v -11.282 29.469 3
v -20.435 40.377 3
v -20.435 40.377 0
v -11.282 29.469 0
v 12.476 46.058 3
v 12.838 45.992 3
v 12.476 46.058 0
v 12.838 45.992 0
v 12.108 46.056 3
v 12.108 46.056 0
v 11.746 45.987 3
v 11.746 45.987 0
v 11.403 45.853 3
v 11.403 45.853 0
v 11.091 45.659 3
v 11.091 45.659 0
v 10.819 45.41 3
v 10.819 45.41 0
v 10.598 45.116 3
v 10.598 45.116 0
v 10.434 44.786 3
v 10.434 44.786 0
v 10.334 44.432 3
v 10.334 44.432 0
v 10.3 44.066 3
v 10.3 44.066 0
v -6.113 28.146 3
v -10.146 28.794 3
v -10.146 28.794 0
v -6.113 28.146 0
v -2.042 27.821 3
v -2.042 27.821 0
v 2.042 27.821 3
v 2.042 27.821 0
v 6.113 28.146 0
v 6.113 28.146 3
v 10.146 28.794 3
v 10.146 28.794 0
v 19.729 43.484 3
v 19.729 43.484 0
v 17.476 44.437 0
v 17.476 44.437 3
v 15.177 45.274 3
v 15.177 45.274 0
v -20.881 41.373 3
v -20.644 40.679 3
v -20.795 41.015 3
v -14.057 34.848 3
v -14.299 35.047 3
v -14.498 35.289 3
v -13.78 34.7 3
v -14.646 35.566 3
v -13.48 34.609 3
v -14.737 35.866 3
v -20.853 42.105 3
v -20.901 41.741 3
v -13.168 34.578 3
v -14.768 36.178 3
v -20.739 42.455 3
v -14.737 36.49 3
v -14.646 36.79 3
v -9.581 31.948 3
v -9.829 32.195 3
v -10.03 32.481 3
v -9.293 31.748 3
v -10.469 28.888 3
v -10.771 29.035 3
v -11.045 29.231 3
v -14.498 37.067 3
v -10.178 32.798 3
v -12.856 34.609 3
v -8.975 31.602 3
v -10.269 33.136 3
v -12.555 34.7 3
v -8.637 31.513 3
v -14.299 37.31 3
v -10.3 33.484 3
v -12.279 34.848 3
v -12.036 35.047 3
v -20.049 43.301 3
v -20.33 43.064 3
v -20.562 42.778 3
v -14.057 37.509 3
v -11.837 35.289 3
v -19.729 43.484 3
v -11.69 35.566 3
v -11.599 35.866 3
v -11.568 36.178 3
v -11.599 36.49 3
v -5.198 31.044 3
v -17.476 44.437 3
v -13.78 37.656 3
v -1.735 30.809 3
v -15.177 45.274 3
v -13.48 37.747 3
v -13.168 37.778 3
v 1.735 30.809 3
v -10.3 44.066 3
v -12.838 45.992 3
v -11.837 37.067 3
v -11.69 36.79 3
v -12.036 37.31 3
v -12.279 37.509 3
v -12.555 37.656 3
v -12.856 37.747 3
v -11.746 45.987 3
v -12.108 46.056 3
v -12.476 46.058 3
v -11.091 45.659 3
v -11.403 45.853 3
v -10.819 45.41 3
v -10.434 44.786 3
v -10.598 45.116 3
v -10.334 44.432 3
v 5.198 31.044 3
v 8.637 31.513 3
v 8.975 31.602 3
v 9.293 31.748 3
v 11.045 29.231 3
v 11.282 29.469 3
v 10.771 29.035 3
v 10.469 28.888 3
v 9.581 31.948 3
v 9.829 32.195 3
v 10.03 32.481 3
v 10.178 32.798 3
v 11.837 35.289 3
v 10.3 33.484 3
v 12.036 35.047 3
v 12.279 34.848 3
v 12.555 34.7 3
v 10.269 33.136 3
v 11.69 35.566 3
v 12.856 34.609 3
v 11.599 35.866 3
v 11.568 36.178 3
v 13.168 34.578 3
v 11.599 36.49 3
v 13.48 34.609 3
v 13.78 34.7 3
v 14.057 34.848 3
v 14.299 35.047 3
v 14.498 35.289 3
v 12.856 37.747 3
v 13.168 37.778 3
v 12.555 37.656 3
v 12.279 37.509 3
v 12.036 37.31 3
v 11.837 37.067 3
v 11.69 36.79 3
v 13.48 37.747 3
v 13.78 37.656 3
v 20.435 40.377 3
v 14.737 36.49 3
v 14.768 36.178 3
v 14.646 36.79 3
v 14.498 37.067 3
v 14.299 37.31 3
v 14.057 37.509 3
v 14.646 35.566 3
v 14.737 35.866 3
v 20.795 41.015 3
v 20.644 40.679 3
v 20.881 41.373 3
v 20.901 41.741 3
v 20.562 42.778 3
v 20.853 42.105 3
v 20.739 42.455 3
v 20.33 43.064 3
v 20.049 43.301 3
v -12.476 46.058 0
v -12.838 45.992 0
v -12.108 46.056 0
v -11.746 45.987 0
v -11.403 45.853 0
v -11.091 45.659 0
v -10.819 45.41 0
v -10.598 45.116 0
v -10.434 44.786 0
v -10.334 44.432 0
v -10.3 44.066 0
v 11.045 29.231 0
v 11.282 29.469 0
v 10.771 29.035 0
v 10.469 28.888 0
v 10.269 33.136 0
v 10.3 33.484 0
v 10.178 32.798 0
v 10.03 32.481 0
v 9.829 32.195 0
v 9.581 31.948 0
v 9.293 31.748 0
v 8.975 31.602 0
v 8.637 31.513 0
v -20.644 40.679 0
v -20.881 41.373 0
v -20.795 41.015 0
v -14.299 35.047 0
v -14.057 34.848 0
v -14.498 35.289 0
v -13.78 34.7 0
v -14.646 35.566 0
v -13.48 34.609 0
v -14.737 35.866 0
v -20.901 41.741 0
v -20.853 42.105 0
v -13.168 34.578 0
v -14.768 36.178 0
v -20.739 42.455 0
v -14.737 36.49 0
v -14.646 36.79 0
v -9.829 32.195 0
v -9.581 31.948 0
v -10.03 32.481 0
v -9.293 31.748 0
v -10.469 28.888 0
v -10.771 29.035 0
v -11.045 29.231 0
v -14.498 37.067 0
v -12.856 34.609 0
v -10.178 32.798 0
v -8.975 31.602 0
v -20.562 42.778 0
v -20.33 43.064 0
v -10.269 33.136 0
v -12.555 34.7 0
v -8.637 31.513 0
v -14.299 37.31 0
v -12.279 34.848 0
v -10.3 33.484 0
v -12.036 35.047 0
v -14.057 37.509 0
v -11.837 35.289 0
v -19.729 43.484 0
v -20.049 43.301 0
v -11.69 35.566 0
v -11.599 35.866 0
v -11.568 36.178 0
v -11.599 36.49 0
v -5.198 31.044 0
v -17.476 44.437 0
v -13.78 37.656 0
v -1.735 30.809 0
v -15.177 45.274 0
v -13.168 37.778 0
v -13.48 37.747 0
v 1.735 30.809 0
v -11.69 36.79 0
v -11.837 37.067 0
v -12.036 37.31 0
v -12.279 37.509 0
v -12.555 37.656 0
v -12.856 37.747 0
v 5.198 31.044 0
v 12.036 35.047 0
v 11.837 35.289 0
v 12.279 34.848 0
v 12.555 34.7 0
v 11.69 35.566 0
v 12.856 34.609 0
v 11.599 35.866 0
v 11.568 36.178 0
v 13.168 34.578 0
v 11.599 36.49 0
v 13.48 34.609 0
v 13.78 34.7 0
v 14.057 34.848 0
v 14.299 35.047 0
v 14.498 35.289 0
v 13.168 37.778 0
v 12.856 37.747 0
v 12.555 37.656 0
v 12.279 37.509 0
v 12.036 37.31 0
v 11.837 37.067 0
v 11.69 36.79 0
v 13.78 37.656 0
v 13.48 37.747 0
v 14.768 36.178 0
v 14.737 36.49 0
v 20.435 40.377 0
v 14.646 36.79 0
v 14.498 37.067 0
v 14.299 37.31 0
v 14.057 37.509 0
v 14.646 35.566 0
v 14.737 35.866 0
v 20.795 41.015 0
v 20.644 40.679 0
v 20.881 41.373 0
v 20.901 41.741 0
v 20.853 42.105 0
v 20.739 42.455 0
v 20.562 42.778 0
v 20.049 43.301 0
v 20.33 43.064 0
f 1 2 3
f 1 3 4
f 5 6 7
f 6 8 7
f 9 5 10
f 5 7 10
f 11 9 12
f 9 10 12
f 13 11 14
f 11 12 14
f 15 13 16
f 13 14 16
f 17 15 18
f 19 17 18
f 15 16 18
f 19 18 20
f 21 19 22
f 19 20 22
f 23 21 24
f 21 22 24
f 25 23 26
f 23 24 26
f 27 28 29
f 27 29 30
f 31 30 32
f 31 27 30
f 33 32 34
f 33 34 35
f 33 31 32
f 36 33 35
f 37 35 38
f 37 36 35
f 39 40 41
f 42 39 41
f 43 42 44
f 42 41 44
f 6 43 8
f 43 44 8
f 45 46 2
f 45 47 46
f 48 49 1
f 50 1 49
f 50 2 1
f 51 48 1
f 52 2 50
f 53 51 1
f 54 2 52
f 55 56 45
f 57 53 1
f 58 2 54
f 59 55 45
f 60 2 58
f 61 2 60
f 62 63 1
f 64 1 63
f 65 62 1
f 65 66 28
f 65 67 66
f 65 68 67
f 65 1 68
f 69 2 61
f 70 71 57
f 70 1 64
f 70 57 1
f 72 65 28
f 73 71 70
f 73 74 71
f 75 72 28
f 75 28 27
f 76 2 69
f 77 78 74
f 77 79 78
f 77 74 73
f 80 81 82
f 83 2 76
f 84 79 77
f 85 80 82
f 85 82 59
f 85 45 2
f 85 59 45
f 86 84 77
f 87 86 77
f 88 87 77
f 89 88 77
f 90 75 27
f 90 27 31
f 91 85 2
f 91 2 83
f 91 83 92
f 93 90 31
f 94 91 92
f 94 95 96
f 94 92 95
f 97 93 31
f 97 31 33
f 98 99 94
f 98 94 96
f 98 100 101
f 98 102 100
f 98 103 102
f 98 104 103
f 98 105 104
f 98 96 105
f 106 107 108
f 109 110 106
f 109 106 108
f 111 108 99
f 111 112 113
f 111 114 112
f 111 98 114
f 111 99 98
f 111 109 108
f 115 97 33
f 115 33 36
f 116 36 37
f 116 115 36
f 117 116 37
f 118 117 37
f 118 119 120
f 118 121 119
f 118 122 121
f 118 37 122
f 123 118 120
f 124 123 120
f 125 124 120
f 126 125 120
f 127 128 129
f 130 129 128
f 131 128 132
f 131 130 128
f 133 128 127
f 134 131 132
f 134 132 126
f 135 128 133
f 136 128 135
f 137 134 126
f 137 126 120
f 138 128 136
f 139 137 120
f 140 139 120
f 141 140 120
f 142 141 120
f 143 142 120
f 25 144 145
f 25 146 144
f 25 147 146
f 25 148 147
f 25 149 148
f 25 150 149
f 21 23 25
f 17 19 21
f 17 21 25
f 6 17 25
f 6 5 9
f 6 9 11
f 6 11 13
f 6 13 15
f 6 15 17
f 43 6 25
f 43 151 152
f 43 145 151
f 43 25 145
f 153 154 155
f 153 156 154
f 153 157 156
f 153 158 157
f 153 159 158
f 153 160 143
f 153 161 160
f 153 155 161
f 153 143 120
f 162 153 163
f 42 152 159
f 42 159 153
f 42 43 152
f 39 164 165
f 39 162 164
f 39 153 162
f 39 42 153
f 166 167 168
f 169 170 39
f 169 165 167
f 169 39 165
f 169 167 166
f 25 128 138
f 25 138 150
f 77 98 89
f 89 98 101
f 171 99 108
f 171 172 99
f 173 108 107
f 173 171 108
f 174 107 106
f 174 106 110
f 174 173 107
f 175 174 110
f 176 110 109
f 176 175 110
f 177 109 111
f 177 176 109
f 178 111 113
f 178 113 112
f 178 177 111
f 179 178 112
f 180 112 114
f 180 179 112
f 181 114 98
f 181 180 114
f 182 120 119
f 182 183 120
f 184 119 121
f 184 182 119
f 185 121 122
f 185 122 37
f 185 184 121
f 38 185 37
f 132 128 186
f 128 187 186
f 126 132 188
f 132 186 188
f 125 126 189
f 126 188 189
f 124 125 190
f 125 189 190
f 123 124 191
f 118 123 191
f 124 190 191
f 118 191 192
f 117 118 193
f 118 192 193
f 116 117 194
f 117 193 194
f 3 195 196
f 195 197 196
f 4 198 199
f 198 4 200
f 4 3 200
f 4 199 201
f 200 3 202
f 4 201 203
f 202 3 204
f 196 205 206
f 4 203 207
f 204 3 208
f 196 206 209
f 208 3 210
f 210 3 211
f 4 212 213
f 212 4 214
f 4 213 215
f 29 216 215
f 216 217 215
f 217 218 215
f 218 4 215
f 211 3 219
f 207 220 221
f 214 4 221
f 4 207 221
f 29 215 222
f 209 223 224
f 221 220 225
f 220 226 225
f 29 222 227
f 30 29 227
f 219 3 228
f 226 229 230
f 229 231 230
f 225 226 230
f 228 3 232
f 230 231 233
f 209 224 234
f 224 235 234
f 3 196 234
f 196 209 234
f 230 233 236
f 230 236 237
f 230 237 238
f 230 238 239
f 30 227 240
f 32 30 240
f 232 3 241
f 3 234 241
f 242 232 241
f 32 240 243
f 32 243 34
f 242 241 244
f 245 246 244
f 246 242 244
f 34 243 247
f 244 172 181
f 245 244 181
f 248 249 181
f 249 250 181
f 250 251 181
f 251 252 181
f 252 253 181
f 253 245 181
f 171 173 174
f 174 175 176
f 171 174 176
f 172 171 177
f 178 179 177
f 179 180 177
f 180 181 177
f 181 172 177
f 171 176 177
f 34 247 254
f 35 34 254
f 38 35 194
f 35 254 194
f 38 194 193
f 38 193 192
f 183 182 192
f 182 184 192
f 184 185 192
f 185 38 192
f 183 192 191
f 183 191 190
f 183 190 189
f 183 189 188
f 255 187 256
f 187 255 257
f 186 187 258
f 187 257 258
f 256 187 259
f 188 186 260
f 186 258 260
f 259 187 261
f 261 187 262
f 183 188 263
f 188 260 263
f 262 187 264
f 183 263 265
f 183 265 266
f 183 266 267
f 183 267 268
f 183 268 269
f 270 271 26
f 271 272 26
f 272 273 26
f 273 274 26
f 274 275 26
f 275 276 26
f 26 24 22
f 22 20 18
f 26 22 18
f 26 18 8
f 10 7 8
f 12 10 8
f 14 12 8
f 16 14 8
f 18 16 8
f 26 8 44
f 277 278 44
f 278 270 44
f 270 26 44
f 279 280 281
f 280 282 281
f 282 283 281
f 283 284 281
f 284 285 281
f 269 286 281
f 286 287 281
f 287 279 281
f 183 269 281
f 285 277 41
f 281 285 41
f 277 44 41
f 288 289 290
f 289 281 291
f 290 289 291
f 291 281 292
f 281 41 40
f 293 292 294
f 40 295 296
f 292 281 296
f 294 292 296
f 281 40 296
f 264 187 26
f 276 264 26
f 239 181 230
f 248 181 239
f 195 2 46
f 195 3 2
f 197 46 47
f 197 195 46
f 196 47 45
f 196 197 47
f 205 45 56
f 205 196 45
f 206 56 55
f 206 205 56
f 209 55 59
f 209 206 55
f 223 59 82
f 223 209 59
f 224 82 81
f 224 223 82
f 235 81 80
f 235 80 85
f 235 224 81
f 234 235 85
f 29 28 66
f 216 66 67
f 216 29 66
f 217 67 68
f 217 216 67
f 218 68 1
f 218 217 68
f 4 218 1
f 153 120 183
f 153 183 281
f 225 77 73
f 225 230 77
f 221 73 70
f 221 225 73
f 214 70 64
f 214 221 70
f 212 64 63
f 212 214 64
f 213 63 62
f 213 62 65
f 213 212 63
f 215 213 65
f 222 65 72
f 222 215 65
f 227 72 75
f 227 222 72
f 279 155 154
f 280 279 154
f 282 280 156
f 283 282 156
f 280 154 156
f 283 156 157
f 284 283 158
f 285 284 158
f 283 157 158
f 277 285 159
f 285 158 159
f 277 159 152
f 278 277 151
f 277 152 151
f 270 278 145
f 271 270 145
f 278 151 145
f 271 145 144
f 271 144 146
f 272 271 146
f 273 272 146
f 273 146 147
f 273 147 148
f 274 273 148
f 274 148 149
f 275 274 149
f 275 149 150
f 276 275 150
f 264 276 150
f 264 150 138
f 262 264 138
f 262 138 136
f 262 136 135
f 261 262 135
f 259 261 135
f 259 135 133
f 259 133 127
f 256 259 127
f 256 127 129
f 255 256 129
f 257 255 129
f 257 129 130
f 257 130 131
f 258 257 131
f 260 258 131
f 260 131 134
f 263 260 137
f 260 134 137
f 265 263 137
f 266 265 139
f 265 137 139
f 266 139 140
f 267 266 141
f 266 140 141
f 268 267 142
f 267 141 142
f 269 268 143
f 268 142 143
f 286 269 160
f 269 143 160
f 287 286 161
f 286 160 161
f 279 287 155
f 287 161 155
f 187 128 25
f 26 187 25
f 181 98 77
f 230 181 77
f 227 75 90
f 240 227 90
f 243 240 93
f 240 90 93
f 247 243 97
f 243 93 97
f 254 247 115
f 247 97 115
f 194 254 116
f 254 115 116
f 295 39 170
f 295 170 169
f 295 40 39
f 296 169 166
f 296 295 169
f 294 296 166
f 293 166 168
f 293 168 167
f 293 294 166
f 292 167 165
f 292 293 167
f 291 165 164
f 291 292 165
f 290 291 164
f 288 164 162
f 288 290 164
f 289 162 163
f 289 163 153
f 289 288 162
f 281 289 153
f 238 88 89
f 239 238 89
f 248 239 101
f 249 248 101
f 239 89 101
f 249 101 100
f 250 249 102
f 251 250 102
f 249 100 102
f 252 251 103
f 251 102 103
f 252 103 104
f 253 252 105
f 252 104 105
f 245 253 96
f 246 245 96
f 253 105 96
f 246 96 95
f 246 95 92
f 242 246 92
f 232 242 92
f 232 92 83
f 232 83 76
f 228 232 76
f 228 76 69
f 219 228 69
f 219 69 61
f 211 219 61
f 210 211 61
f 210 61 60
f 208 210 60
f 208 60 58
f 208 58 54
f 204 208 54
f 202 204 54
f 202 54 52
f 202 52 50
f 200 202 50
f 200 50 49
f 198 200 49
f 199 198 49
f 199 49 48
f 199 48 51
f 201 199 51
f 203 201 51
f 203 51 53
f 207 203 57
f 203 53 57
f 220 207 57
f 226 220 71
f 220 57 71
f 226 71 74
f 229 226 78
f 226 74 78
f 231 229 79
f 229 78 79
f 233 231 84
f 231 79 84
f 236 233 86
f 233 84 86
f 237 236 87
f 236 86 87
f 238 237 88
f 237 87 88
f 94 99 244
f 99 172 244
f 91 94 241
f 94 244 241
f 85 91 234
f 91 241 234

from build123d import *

# Parameters (mm, degrees)
SKETCH_1_R          = 47.75
EXTRUDE_1_DEPTH     = 3
SKETCH_2_R          = 1.6
CUT_EXTRUDE_1_DEPTH = 68.595303091
FILLET_1_R          = 2


with BuildPart() as part:
    # ｽｹｯﾁ1 → ﾎﾞｽ - 押し出し1 (new body)
    with BuildSketch(Plane.XY):
        Circle(SKETCH_1_R)
    extrude(amount=EXTRUDE_1_DEPTH)

    # ｽｹｯﾁ2 → ｶｯﾄ - 押し出し1 (cut, through all)
    with BuildSketch(Plane.XY.offset(3)):
        with Locations((-13.167775518, 36.1781659)):
            Circle(SKETCH_2_R)
        with Locations((13.167775518, 36.1781659)):
            Circle(SKETCH_2_R)
        with BuildLine():
            Line((-10.3, 46.625878008), (-10.3, 31.825692416))
            ThreePointArc((-10.3, 31.825692416), (0, 30.78), (10.3, 31.825692416))
            Line((10.3, 31.825692416), (10.3, 46.625878008))
            ThreePointArc((10.3, 46.625878008), (0, 47.75), (-10.3, 46.625878008))
        make_face()
        with BuildLine():
            Line((-22.08027891, 42.338207133), (-10.836871488, 28.938835945))
            ThreePointArc((-10.836871488, 28.938835945), (0, 27.78), (10.836871488, 28.938835945))
            Line((10.836871488, 28.938835945), (22.08027891, 42.338207133))
            ThreePointArc((22.08027891, 42.338207133), (0, -47.75), (-22.08027891, 42.338207133))
        make_face()
    extrude(amount=-CUT_EXTRUDE_1_DEPTH, mode=Mode.SUBTRACT)

    # ﾌｨﾚｯﾄ1
    fillet_1_edges = [part.edges().sort_by_distance(p)[0] for p in [
        (22.08027891, 42.338207133, 1.5),
        (-22.08027891, 42.338207133, 1.5),
        (-10.836871488, 28.938835945, 1.5),
        (10.836871488, 28.938835945, 1.5),
        (-10.3, 46.625878008, 1.5),
        (10.3, 46.625878008, 1.5),
        (10.3, 31.825692416, 1.5),
        (-10.3, 31.825692416, 1.5),
    ]]
    fillet(fillet_1_edges, radius=FILLET_1_R)


solid = part.part
